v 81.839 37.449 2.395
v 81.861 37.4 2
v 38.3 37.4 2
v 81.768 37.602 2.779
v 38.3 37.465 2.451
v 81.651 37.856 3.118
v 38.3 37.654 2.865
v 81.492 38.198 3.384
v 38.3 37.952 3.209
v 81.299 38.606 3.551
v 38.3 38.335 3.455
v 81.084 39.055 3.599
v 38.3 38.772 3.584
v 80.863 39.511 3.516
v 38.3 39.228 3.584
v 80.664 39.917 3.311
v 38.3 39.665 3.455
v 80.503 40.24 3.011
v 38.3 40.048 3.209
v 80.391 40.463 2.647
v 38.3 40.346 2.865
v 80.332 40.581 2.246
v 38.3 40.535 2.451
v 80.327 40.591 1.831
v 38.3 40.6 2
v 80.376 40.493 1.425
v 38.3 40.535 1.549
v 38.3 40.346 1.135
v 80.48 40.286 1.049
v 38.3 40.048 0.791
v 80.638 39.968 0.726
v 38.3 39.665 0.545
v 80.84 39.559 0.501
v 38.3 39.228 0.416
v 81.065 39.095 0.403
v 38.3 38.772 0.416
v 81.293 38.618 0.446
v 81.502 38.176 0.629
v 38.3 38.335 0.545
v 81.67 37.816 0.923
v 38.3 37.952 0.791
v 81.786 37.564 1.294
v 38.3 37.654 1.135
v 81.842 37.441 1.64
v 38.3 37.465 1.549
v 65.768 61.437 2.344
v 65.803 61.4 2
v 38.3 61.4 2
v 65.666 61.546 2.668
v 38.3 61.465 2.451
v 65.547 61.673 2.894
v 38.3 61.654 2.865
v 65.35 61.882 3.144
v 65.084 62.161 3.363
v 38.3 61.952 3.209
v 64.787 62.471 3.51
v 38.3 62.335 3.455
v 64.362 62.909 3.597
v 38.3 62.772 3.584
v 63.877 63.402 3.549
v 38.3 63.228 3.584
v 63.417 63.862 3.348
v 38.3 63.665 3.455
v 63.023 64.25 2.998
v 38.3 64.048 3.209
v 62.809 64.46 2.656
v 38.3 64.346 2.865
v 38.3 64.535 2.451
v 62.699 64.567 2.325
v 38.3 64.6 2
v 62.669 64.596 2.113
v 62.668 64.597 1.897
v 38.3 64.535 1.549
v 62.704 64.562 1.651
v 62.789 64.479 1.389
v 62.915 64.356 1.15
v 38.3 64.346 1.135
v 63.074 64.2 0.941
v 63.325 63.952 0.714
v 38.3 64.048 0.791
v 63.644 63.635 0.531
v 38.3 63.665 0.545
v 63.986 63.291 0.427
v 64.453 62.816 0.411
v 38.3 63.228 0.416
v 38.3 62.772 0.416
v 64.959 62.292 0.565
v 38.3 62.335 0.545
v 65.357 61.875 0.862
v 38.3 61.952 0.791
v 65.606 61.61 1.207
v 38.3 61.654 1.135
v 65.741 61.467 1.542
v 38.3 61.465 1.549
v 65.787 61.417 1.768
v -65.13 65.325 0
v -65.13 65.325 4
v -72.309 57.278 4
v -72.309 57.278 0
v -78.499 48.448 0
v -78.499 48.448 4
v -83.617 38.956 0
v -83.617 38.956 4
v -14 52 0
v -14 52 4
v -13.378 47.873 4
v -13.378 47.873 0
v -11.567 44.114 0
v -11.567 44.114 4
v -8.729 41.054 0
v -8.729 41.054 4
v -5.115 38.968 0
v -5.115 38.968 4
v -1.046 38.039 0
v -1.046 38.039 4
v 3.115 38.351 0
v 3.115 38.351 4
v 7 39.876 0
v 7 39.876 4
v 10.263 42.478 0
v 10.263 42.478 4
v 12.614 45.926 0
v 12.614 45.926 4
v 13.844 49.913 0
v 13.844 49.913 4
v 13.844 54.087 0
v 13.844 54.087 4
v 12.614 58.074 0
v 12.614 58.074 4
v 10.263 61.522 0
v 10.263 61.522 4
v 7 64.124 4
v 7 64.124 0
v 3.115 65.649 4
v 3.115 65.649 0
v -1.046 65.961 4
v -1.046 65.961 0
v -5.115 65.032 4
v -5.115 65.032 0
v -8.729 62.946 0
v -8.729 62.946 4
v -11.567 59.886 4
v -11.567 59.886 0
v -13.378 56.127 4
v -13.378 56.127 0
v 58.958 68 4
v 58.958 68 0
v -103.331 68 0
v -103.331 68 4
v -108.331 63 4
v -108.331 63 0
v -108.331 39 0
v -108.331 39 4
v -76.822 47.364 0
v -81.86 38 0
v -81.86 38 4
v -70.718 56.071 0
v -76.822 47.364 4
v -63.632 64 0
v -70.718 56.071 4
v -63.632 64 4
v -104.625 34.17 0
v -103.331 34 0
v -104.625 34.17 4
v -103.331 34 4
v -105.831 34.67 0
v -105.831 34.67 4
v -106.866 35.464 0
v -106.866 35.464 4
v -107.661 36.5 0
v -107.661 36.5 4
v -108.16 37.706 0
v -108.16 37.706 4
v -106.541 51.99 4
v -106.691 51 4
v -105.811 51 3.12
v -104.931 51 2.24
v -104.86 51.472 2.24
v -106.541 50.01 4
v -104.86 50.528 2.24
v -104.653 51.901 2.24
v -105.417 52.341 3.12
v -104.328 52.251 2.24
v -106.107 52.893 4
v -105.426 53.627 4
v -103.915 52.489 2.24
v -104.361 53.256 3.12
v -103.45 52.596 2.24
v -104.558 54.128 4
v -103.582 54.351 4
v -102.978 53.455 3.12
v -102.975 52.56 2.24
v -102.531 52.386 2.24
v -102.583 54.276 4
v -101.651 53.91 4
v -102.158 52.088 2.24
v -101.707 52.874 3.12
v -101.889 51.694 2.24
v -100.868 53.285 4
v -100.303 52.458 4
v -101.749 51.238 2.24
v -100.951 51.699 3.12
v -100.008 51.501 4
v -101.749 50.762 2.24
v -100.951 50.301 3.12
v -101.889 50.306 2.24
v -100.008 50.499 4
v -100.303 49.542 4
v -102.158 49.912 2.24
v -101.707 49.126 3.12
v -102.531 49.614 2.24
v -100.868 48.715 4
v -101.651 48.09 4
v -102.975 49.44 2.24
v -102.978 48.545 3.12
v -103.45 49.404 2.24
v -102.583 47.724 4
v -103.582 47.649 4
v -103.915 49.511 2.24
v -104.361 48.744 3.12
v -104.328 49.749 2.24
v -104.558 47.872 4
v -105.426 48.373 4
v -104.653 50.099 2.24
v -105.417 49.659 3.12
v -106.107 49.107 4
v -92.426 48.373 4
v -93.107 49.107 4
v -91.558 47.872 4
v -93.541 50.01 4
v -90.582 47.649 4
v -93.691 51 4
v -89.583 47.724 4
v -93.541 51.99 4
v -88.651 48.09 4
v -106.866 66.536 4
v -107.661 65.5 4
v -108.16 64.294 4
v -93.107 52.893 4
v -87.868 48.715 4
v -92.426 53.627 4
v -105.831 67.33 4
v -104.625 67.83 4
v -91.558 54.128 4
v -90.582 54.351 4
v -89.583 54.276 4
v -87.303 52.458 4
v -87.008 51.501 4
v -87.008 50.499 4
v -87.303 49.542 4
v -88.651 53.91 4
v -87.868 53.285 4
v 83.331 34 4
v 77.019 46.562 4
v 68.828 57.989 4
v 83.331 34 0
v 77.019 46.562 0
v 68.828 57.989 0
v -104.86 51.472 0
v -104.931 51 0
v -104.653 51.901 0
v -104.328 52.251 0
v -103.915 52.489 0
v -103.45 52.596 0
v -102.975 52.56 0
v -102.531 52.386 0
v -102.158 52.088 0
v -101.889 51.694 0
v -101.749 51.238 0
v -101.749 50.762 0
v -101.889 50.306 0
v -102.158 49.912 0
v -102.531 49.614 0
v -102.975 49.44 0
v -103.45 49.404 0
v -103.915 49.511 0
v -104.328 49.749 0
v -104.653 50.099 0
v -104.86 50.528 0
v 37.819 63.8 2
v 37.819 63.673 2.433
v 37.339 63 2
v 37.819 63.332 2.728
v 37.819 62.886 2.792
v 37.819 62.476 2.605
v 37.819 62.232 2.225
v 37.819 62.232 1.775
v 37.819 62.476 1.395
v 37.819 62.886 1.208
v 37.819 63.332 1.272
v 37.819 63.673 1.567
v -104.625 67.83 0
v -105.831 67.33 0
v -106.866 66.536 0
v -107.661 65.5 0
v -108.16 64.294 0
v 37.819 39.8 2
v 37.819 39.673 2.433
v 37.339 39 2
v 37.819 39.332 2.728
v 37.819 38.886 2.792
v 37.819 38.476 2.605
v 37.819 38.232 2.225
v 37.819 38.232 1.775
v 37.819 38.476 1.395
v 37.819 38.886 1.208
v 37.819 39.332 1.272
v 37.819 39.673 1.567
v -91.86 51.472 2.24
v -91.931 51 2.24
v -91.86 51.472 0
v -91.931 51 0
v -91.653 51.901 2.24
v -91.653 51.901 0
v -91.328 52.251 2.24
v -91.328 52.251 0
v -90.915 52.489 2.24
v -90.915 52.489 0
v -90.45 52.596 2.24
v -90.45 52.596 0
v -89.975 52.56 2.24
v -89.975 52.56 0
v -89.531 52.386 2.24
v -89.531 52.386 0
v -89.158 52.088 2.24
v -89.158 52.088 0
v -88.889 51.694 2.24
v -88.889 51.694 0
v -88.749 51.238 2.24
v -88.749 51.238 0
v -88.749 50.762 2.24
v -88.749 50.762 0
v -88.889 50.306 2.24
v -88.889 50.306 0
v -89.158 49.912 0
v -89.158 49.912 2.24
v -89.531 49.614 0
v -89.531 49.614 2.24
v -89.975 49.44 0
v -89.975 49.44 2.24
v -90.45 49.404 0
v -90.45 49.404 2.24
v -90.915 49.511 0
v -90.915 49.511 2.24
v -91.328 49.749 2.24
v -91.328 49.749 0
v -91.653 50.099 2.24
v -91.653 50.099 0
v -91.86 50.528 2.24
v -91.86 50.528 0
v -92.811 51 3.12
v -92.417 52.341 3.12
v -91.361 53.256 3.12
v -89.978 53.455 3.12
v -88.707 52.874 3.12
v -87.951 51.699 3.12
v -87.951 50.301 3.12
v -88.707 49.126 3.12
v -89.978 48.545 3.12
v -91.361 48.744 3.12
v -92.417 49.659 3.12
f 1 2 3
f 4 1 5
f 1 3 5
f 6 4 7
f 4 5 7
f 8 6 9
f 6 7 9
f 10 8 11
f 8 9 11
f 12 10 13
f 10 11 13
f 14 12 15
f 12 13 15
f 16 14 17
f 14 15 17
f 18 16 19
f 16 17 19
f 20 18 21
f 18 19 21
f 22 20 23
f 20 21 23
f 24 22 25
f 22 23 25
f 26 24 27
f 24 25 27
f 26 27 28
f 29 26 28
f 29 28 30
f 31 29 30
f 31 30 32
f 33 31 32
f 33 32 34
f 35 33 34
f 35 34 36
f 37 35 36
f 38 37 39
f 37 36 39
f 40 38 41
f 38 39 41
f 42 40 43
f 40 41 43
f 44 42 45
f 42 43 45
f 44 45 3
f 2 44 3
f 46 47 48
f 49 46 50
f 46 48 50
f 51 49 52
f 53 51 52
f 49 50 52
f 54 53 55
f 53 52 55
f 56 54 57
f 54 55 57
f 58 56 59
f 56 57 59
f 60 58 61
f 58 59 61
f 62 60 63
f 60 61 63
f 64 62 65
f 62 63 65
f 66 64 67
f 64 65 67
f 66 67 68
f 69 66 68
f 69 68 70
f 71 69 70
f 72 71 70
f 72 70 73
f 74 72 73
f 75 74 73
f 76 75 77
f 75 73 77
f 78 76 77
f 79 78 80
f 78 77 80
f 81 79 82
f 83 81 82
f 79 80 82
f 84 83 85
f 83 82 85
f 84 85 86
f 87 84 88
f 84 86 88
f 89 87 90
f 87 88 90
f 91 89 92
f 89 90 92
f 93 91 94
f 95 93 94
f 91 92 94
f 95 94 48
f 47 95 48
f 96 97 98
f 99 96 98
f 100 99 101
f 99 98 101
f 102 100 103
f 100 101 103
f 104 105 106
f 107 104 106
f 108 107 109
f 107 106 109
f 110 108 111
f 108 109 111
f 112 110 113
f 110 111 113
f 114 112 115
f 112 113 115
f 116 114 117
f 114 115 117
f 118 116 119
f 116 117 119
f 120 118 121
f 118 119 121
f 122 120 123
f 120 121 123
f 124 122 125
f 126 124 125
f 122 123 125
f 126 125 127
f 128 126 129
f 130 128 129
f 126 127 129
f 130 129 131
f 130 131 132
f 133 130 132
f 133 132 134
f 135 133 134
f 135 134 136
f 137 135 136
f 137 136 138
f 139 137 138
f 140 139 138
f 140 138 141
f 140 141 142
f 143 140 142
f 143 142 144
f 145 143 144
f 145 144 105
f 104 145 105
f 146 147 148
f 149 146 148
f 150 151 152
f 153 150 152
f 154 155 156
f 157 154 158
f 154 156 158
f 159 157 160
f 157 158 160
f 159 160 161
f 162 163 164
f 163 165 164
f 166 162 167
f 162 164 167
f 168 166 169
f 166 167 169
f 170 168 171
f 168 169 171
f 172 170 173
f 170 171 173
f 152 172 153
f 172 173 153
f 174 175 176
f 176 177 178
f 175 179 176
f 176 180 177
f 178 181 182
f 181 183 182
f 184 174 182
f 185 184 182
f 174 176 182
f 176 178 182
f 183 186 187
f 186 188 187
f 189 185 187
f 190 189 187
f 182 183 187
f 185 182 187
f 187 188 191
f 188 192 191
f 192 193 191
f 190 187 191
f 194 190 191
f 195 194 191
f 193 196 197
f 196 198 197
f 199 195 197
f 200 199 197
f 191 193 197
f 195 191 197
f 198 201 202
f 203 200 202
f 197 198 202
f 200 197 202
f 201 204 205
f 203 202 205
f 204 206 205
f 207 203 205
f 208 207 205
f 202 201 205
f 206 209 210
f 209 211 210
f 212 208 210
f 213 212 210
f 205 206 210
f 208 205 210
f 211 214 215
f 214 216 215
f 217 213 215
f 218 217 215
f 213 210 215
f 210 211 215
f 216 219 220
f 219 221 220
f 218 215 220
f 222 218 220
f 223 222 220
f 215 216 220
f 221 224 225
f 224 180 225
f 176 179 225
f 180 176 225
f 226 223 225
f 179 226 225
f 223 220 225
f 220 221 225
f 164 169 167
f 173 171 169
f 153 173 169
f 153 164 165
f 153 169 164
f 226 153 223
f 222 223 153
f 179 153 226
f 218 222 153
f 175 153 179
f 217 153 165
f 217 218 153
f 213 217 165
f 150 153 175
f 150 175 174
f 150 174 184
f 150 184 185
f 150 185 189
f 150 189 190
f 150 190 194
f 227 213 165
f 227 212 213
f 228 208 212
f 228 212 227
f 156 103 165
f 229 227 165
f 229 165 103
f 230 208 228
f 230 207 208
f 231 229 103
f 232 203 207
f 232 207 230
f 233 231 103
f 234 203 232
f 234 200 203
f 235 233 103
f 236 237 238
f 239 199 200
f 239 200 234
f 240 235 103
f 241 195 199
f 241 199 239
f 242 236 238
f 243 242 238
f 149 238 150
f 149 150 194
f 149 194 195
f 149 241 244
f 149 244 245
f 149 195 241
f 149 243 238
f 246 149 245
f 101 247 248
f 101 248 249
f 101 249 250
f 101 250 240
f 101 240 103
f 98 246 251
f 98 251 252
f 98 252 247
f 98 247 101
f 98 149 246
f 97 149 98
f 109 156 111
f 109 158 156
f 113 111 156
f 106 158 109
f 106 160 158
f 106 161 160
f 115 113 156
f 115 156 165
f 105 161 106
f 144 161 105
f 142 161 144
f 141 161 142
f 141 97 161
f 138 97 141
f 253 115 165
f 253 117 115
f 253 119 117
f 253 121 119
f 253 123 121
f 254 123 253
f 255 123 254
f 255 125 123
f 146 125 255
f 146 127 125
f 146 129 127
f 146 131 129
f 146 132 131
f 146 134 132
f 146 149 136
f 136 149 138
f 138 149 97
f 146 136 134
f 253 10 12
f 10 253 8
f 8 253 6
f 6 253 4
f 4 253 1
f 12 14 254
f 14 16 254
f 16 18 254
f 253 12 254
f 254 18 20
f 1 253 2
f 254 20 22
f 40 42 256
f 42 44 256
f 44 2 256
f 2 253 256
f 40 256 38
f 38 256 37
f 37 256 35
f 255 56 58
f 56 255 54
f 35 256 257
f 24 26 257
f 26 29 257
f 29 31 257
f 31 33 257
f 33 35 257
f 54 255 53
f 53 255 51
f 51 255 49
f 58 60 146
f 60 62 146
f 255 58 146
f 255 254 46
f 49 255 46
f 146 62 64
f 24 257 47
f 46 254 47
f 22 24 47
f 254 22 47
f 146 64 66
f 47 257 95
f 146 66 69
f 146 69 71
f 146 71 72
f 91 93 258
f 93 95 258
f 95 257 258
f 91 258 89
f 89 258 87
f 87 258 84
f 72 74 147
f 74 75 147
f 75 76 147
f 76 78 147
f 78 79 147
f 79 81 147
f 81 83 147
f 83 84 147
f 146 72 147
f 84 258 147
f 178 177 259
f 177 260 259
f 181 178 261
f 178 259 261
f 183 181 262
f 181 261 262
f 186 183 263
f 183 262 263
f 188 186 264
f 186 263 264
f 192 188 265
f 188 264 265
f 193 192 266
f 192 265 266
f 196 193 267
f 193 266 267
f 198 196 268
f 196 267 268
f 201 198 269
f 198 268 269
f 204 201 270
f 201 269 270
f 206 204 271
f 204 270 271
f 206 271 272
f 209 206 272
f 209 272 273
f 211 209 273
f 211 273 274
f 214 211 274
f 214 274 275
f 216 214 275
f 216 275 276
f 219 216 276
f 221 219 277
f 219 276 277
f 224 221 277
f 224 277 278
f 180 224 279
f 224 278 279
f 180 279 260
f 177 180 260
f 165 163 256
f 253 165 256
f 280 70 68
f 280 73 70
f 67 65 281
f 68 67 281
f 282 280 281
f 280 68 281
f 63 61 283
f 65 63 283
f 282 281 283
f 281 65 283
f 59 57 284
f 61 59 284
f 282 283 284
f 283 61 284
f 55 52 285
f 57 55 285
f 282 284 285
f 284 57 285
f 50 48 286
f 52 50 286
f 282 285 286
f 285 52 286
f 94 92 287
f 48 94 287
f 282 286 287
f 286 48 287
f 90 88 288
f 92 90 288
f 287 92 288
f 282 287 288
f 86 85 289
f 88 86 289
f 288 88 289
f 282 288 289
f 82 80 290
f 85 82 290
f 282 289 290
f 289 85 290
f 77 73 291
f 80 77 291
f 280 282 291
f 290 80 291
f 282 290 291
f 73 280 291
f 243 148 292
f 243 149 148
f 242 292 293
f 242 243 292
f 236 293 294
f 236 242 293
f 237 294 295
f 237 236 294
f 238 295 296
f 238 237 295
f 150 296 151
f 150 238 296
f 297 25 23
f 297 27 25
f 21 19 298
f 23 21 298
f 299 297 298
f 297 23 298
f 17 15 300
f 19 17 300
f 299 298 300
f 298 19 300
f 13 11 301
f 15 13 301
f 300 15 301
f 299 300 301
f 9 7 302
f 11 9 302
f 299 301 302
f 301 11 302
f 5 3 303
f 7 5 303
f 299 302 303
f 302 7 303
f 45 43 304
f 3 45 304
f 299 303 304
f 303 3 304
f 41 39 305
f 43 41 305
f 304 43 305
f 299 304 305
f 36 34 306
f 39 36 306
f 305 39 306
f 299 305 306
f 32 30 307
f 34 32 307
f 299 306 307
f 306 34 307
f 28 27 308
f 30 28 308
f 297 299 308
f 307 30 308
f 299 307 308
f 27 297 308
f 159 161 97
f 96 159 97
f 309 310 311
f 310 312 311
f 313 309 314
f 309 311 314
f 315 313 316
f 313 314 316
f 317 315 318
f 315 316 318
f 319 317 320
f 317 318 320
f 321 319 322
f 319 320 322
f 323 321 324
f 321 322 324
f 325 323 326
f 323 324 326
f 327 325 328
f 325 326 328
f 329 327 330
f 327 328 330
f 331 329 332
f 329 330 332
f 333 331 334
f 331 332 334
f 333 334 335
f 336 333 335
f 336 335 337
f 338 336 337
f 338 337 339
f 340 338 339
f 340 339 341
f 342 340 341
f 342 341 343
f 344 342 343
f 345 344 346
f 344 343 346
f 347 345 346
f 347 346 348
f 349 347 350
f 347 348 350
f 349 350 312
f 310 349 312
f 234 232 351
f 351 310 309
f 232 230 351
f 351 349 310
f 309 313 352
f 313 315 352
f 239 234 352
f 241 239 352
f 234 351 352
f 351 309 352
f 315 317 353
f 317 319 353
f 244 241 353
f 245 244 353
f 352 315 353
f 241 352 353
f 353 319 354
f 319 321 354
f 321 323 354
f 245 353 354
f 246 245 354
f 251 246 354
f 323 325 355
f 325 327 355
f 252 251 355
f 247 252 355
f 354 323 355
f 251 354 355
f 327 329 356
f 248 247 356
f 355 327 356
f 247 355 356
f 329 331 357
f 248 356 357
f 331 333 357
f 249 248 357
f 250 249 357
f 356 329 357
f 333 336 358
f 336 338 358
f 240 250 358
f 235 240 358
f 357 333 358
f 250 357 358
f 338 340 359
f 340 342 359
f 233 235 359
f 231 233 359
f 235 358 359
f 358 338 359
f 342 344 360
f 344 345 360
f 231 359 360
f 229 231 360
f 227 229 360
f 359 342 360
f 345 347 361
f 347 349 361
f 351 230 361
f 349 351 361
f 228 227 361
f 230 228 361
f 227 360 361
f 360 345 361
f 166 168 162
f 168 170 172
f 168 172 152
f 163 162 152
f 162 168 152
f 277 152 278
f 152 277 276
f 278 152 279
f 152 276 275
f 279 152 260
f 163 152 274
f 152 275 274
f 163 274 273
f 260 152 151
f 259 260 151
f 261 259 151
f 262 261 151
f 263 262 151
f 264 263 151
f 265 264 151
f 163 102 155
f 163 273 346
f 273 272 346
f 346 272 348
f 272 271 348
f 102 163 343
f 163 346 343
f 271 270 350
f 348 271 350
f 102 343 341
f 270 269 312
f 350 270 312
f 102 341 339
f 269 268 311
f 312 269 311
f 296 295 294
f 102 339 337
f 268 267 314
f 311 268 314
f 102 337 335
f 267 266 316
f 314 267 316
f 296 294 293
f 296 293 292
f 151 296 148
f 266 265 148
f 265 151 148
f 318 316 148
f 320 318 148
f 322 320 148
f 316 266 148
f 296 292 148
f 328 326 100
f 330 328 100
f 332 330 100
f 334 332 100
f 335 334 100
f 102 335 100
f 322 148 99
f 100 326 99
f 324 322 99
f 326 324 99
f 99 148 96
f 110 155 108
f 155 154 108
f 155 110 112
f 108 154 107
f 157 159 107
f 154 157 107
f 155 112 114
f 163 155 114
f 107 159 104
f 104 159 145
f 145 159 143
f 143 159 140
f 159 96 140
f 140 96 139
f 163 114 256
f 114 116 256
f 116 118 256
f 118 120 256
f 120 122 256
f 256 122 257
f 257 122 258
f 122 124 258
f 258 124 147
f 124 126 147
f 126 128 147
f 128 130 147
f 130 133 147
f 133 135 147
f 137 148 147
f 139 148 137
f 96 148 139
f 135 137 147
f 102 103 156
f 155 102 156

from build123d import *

# Parameters (mm, degrees)
F3_DEPTH        = 4
F4_DEPTH        = 4
F7_D            = 3.2
F7_DEPTH        = 45
F7_TIP          = 0.9613769904
F8_D            = 28
F10_D           = 3.2
F10_DEPTH       = 60
F10_CSINK_D     = 6.72
F10_CSINK_ANGLE = 90
F10_TIP         = 0.9613769904
F12_DEPTH       = 4.0010001
F13_R           = 5


with BuildPart() as f3:
    # F0 (on Top) → F3 (new body)
    with BuildSketch(Plane.XY):
        with BuildLine():
            Line((-83.330666624, 34), (83.330666624, 34))
            ThreePointArc((83.330666624, 34), (73.1470337796, 52.4357840529), (58.9576118919, 68))
            Line((58.9576118919, 68), (-58.9576118919, 68))
            Line((-58.9576118919, 68), (-108.330666624, 68))
            Line((-108.330666624, 68), (-108.330666624, 34))
            Line((-108.330666624, 34), (-83.330666624, 34))
        make_face()
    extrude(amount=F3_DEPTH)

    # F0 (on Top) → F4 (join)
    with BuildSketch(Plane.XY):
        with BuildLine():
            Line((-83.330666624, 34), (83.330666624, 34))
            ThreePointArc((83.330666624, 34), (73.1470337796, 52.4357840529), (58.9576118919, 68))
            Line((58.9576118919, 68), (-58.9576118919, 68))
            Line((-58.9576118919, 68), (-108.330666624, 68))
            Line((-108.330666624, 68), (-108.330666624, 34))
            Line((-108.330666624, 34), (-83.330666624, 34))
        make_face()
    extrude(amount=F4_DEPTH)

    # F7
    with Locations(Plane.YZ.offset(83.3)):
        with Locations((63, 2), (39, 2)):
            Hole(F7_D / 2, depth=F7_DEPTH)
            with Locations((0, 0, -(F7_DEPTH + F7_TIP / 2))):  # 118° drill point
                Cone(0, F7_D / 2, F7_TIP, mode=Mode.SUBTRACT)

    # F8 (through all)
    with Locations(Plane(origin=(0, 0, 0), x_dir=(1, 0, 0), z_dir=(0, 0, -1))):
        with Locations((0, -52)):
            Hole(F8_D / 2)

    # F10
    with Locations(Plane.XY.offset(4)):
        with Locations((-103.330666624, 51), (-90.330666624, 51)):
            CounterSinkHole(F10_D / 2, F10_CSINK_D / 2, depth=F10_DEPTH, counter_sink_angle=F10_CSINK_ANGLE)
            with Locations((0, 0, -(F10_DEPTH + F10_TIP / 2))):  # 118° drill point
                Cone(0, F10_D / 2, F10_TIP, mode=Mode.SUBTRACT)

    # F11 (on face) → F12 (cut, through all)
    with BuildSketch(Plane.XY.offset(4)):
        with BuildLine():
            ThreePointArc((-81.8600177132, 38), (-73.8985762248, 51.8079427496), (-63.6322441848, 64))
            Line((-63.6322441848, 64), (-65.1300137514, 65.3254004397))
            ThreePointArc((-65.1300137514, 65.3254004397), (-75.5329519196, 52.9537515968), (-83.6166513022, 38.9561581637))
            Line((-83.6166513022, 38.9561581637), (-81.8600177132, 38))
        make_face()
    extrude(amount=-F12_DEPTH, mode=Mode.SUBTRACT)

    # F13
    f13_edges = [f3.edges().sort_by_distance(p)[0] for p in [
        (-108.330667, 34, 2),
        (-108.330667, 68, 2),
    ]]
    fillet(f13_edges, radius=F13_R)


solid = f3.part
